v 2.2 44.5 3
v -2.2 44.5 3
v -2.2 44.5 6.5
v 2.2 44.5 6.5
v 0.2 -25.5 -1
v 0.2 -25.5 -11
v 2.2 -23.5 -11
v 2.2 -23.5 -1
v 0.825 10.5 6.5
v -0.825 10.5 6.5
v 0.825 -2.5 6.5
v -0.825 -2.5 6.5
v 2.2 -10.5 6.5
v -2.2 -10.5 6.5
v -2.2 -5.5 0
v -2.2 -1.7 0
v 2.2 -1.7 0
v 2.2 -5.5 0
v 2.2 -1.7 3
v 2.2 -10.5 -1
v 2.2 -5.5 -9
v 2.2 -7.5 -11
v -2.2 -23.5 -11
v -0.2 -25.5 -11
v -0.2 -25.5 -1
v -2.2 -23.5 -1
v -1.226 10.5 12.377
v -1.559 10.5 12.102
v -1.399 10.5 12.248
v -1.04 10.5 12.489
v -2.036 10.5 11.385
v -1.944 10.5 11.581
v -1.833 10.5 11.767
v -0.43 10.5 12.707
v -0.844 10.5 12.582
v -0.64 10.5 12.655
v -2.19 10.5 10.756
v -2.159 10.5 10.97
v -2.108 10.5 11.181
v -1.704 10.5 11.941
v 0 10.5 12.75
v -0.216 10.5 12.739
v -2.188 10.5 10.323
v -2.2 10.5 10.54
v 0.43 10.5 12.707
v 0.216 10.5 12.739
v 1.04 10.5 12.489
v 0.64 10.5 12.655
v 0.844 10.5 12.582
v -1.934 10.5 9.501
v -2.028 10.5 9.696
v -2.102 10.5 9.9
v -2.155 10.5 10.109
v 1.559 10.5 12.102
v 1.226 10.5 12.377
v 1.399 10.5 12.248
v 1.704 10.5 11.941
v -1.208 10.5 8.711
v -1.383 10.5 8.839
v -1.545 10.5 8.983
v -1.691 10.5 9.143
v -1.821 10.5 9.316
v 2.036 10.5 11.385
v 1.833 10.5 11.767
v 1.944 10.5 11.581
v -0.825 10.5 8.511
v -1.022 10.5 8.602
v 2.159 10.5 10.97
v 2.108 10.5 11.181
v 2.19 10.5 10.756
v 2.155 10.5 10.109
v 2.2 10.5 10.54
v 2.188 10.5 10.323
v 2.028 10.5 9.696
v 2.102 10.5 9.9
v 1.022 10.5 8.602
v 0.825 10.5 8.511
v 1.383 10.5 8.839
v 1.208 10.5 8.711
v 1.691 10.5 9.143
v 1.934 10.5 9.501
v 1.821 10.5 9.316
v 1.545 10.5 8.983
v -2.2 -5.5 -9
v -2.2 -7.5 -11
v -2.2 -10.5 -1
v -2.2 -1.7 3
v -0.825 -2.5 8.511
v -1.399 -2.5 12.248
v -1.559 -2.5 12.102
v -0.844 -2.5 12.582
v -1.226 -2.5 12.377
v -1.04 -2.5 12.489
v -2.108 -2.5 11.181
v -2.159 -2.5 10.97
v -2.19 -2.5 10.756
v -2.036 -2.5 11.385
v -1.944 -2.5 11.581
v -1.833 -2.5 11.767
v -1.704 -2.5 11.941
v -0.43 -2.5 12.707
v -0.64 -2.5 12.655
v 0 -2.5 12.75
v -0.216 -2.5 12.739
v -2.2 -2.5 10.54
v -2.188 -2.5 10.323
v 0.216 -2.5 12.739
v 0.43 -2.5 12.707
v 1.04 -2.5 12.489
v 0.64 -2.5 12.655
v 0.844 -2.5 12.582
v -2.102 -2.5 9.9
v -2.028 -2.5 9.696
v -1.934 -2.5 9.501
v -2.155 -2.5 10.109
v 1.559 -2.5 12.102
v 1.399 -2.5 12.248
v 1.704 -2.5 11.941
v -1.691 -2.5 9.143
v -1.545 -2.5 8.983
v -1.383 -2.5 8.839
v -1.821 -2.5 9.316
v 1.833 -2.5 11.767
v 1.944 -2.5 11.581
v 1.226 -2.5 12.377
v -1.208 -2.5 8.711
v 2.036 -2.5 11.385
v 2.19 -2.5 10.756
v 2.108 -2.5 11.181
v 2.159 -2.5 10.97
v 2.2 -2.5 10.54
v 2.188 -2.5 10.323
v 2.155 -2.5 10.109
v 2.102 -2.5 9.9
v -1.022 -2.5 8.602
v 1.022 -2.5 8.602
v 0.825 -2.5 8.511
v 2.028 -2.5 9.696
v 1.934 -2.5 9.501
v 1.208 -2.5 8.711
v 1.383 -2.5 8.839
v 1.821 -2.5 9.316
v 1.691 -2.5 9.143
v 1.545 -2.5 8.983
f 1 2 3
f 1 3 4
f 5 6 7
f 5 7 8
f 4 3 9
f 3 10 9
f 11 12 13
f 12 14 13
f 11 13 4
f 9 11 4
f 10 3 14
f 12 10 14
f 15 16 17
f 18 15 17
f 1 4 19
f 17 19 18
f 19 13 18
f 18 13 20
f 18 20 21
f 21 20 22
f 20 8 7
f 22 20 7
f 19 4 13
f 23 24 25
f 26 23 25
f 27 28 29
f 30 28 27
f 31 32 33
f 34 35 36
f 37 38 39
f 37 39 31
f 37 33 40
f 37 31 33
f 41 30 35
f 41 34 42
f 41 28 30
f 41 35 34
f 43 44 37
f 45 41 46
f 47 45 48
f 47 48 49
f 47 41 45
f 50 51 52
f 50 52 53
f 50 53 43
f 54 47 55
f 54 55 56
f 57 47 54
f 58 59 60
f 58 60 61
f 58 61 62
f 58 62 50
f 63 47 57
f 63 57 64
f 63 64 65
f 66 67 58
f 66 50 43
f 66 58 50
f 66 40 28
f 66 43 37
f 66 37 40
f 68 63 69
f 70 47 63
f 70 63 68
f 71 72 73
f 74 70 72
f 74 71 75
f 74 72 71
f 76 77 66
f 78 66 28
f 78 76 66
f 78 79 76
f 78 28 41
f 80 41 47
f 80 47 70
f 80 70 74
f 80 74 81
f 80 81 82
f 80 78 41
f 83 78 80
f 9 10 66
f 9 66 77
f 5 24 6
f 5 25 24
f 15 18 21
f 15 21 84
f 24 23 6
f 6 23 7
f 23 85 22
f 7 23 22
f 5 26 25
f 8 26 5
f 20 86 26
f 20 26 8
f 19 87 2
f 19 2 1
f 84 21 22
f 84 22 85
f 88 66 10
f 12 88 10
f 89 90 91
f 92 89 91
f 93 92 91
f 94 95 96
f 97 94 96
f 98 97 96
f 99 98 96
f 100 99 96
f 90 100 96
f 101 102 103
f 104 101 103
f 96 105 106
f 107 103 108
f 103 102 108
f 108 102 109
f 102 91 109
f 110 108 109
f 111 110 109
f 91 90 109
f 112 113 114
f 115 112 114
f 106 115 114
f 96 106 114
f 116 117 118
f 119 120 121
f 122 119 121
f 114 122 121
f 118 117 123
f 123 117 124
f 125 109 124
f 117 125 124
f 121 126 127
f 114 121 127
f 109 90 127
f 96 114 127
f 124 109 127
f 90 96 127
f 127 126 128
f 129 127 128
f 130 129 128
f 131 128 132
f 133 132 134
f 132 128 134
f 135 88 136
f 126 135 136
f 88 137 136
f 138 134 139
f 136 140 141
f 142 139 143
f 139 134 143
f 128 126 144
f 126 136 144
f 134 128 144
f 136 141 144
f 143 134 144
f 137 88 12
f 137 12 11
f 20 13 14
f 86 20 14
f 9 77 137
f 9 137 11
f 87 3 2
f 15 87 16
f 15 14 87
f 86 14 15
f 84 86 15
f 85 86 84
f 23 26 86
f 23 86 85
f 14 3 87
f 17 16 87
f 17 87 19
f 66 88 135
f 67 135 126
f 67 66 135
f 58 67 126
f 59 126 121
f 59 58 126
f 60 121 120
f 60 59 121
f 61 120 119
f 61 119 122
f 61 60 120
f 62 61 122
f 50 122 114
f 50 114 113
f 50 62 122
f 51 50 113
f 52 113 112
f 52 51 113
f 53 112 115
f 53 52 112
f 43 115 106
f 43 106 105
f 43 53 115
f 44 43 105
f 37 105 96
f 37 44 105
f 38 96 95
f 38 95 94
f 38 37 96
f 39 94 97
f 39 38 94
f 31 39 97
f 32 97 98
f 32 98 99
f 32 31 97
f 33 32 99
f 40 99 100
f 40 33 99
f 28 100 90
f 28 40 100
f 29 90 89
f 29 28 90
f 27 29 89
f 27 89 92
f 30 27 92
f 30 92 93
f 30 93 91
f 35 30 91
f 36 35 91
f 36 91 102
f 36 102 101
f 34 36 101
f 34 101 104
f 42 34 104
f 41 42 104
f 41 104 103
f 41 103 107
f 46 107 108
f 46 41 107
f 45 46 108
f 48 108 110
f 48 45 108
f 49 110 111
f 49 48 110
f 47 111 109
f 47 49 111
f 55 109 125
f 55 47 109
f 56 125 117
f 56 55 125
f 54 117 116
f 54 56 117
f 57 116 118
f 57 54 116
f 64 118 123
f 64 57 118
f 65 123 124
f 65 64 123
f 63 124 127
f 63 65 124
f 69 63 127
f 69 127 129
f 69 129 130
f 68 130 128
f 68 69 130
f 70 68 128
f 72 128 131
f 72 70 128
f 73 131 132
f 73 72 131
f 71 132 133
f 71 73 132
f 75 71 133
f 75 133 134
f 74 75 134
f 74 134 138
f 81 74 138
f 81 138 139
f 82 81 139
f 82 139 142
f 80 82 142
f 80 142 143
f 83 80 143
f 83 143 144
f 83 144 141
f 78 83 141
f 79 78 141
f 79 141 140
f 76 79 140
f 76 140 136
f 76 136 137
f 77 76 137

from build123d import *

# Parameters (mm, degrees)
SZKIC1_W                    = 4.4
SZKIC1_H                    = 21
DODANIE_WYCI_GNI_CIE1_DEPTH = 6.5
SZKIC3_R                    = 2.2
SZKIC3_W                    = 1.65
SZKIC3_H                    = 4.05
DODANIE_WYCI_GNI_CIE2_DEPTH = 13
SKETCH1_W                   = 4.4
SKETCH1_H                   = 5
BOSS_EXTRUDE1_DEPTH         = 11
SKETCH3_W                   = 4.4
SKETCH3_H                   = 10
BOSS_EXTRUDE3_DEPTH         = 15
CHAMFER1_SIZE               = 2
SKETCH5_W                   = 4.4
SKETCH5_H                   = 3
CUT_EXTRUDE1_DEPTH          = 12.2
SZKIC4_W                    = 4.4
SZKIC4_H                    = 3.5
DODANIE_WYCI_GNI_CIE3_DEPTH = 34


with BuildPart() as part:
    # Szkic1 → Dodanie-wyciągnięcie1 (new body)
    with BuildSketch(Plane.XY):
        Rectangle(SZKIC1_W, SZKIC1_H)
    extrude(amount=DODANIE_WYCI_GNI_CIE1_DEPTH)

    # Szkic3 → Dodanie-wyciągnięcie2 (add)
    with BuildSketch(Plane(origin=(0, 10.5, 0), x_dir=(1, 0, 0), z_dir=(0, 1, 0))):
        with Locations((0, -10.55)):
            Circle(SZKIC3_R)
        with Locations((0, -8.525)):
            Rectangle(SZKIC3_W, SZKIC3_H)
    extrude(amount=-DODANIE_WYCI_GNI_CIE2_DEPTH)

    # Sketch1 → Boss-Extrude1 (add)
    with BuildSketch(Plane(origin=(0, 0, 0), x_dir=(-1, 0, 0), z_dir=(0, 0, -1))):
        with Locations((0, -8)):
            Rectangle(SKETCH1_W, SKETCH1_H)
    extrude(amount=BOSS_EXTRUDE1_DEPTH)

    # Sketch3 → Boss-Extrude3 (add)
    with BuildSketch(Plane.XZ.offset(10.5)):
        with Locations((0, -6)):
            Rectangle(SKETCH3_W, SKETCH3_H)
    extrude(amount=BOSS_EXTRUDE3_DEPTH)

    # Chamfer1
    chamfer1_edges = [part.edges().sort_by_distance(p)[0] for p in [
        (0, -5.5, -11),
        (2.2, -25.5, -6),
        (-2.2, -25.5, -6),
    ]]
    chamfer(chamfer1_edges, length=CHAMFER1_SIZE)

    # Sketch5 → Cut-Extrude1 (cut)
    with BuildSketch(Plane(origin=(0, 10.5, 0), x_dir=(1, 0, 0), z_dir=(0, 1, 0))):
        with Locations((0, -1.5)):
            Rectangle(SKETCH5_W, SKETCH5_H)
    extrude(amount=-CUT_EXTRUDE1_DEPTH, mode=Mode.SUBTRACT)

    # Szkic4 → Dodanie-wyciągnięcie3 (add)
    with BuildSketch(Plane(origin=(0, 10.5, 0), x_dir=(1, 0, 0), z_dir=(0, 1, 0))):
        with Locations((0, -4.75)):
            Rectangle(SZKIC4_W, SZKIC4_H)
    extrude(amount=DODANIE_WYCI_GNI_CIE3_DEPTH)


solid = part.part
